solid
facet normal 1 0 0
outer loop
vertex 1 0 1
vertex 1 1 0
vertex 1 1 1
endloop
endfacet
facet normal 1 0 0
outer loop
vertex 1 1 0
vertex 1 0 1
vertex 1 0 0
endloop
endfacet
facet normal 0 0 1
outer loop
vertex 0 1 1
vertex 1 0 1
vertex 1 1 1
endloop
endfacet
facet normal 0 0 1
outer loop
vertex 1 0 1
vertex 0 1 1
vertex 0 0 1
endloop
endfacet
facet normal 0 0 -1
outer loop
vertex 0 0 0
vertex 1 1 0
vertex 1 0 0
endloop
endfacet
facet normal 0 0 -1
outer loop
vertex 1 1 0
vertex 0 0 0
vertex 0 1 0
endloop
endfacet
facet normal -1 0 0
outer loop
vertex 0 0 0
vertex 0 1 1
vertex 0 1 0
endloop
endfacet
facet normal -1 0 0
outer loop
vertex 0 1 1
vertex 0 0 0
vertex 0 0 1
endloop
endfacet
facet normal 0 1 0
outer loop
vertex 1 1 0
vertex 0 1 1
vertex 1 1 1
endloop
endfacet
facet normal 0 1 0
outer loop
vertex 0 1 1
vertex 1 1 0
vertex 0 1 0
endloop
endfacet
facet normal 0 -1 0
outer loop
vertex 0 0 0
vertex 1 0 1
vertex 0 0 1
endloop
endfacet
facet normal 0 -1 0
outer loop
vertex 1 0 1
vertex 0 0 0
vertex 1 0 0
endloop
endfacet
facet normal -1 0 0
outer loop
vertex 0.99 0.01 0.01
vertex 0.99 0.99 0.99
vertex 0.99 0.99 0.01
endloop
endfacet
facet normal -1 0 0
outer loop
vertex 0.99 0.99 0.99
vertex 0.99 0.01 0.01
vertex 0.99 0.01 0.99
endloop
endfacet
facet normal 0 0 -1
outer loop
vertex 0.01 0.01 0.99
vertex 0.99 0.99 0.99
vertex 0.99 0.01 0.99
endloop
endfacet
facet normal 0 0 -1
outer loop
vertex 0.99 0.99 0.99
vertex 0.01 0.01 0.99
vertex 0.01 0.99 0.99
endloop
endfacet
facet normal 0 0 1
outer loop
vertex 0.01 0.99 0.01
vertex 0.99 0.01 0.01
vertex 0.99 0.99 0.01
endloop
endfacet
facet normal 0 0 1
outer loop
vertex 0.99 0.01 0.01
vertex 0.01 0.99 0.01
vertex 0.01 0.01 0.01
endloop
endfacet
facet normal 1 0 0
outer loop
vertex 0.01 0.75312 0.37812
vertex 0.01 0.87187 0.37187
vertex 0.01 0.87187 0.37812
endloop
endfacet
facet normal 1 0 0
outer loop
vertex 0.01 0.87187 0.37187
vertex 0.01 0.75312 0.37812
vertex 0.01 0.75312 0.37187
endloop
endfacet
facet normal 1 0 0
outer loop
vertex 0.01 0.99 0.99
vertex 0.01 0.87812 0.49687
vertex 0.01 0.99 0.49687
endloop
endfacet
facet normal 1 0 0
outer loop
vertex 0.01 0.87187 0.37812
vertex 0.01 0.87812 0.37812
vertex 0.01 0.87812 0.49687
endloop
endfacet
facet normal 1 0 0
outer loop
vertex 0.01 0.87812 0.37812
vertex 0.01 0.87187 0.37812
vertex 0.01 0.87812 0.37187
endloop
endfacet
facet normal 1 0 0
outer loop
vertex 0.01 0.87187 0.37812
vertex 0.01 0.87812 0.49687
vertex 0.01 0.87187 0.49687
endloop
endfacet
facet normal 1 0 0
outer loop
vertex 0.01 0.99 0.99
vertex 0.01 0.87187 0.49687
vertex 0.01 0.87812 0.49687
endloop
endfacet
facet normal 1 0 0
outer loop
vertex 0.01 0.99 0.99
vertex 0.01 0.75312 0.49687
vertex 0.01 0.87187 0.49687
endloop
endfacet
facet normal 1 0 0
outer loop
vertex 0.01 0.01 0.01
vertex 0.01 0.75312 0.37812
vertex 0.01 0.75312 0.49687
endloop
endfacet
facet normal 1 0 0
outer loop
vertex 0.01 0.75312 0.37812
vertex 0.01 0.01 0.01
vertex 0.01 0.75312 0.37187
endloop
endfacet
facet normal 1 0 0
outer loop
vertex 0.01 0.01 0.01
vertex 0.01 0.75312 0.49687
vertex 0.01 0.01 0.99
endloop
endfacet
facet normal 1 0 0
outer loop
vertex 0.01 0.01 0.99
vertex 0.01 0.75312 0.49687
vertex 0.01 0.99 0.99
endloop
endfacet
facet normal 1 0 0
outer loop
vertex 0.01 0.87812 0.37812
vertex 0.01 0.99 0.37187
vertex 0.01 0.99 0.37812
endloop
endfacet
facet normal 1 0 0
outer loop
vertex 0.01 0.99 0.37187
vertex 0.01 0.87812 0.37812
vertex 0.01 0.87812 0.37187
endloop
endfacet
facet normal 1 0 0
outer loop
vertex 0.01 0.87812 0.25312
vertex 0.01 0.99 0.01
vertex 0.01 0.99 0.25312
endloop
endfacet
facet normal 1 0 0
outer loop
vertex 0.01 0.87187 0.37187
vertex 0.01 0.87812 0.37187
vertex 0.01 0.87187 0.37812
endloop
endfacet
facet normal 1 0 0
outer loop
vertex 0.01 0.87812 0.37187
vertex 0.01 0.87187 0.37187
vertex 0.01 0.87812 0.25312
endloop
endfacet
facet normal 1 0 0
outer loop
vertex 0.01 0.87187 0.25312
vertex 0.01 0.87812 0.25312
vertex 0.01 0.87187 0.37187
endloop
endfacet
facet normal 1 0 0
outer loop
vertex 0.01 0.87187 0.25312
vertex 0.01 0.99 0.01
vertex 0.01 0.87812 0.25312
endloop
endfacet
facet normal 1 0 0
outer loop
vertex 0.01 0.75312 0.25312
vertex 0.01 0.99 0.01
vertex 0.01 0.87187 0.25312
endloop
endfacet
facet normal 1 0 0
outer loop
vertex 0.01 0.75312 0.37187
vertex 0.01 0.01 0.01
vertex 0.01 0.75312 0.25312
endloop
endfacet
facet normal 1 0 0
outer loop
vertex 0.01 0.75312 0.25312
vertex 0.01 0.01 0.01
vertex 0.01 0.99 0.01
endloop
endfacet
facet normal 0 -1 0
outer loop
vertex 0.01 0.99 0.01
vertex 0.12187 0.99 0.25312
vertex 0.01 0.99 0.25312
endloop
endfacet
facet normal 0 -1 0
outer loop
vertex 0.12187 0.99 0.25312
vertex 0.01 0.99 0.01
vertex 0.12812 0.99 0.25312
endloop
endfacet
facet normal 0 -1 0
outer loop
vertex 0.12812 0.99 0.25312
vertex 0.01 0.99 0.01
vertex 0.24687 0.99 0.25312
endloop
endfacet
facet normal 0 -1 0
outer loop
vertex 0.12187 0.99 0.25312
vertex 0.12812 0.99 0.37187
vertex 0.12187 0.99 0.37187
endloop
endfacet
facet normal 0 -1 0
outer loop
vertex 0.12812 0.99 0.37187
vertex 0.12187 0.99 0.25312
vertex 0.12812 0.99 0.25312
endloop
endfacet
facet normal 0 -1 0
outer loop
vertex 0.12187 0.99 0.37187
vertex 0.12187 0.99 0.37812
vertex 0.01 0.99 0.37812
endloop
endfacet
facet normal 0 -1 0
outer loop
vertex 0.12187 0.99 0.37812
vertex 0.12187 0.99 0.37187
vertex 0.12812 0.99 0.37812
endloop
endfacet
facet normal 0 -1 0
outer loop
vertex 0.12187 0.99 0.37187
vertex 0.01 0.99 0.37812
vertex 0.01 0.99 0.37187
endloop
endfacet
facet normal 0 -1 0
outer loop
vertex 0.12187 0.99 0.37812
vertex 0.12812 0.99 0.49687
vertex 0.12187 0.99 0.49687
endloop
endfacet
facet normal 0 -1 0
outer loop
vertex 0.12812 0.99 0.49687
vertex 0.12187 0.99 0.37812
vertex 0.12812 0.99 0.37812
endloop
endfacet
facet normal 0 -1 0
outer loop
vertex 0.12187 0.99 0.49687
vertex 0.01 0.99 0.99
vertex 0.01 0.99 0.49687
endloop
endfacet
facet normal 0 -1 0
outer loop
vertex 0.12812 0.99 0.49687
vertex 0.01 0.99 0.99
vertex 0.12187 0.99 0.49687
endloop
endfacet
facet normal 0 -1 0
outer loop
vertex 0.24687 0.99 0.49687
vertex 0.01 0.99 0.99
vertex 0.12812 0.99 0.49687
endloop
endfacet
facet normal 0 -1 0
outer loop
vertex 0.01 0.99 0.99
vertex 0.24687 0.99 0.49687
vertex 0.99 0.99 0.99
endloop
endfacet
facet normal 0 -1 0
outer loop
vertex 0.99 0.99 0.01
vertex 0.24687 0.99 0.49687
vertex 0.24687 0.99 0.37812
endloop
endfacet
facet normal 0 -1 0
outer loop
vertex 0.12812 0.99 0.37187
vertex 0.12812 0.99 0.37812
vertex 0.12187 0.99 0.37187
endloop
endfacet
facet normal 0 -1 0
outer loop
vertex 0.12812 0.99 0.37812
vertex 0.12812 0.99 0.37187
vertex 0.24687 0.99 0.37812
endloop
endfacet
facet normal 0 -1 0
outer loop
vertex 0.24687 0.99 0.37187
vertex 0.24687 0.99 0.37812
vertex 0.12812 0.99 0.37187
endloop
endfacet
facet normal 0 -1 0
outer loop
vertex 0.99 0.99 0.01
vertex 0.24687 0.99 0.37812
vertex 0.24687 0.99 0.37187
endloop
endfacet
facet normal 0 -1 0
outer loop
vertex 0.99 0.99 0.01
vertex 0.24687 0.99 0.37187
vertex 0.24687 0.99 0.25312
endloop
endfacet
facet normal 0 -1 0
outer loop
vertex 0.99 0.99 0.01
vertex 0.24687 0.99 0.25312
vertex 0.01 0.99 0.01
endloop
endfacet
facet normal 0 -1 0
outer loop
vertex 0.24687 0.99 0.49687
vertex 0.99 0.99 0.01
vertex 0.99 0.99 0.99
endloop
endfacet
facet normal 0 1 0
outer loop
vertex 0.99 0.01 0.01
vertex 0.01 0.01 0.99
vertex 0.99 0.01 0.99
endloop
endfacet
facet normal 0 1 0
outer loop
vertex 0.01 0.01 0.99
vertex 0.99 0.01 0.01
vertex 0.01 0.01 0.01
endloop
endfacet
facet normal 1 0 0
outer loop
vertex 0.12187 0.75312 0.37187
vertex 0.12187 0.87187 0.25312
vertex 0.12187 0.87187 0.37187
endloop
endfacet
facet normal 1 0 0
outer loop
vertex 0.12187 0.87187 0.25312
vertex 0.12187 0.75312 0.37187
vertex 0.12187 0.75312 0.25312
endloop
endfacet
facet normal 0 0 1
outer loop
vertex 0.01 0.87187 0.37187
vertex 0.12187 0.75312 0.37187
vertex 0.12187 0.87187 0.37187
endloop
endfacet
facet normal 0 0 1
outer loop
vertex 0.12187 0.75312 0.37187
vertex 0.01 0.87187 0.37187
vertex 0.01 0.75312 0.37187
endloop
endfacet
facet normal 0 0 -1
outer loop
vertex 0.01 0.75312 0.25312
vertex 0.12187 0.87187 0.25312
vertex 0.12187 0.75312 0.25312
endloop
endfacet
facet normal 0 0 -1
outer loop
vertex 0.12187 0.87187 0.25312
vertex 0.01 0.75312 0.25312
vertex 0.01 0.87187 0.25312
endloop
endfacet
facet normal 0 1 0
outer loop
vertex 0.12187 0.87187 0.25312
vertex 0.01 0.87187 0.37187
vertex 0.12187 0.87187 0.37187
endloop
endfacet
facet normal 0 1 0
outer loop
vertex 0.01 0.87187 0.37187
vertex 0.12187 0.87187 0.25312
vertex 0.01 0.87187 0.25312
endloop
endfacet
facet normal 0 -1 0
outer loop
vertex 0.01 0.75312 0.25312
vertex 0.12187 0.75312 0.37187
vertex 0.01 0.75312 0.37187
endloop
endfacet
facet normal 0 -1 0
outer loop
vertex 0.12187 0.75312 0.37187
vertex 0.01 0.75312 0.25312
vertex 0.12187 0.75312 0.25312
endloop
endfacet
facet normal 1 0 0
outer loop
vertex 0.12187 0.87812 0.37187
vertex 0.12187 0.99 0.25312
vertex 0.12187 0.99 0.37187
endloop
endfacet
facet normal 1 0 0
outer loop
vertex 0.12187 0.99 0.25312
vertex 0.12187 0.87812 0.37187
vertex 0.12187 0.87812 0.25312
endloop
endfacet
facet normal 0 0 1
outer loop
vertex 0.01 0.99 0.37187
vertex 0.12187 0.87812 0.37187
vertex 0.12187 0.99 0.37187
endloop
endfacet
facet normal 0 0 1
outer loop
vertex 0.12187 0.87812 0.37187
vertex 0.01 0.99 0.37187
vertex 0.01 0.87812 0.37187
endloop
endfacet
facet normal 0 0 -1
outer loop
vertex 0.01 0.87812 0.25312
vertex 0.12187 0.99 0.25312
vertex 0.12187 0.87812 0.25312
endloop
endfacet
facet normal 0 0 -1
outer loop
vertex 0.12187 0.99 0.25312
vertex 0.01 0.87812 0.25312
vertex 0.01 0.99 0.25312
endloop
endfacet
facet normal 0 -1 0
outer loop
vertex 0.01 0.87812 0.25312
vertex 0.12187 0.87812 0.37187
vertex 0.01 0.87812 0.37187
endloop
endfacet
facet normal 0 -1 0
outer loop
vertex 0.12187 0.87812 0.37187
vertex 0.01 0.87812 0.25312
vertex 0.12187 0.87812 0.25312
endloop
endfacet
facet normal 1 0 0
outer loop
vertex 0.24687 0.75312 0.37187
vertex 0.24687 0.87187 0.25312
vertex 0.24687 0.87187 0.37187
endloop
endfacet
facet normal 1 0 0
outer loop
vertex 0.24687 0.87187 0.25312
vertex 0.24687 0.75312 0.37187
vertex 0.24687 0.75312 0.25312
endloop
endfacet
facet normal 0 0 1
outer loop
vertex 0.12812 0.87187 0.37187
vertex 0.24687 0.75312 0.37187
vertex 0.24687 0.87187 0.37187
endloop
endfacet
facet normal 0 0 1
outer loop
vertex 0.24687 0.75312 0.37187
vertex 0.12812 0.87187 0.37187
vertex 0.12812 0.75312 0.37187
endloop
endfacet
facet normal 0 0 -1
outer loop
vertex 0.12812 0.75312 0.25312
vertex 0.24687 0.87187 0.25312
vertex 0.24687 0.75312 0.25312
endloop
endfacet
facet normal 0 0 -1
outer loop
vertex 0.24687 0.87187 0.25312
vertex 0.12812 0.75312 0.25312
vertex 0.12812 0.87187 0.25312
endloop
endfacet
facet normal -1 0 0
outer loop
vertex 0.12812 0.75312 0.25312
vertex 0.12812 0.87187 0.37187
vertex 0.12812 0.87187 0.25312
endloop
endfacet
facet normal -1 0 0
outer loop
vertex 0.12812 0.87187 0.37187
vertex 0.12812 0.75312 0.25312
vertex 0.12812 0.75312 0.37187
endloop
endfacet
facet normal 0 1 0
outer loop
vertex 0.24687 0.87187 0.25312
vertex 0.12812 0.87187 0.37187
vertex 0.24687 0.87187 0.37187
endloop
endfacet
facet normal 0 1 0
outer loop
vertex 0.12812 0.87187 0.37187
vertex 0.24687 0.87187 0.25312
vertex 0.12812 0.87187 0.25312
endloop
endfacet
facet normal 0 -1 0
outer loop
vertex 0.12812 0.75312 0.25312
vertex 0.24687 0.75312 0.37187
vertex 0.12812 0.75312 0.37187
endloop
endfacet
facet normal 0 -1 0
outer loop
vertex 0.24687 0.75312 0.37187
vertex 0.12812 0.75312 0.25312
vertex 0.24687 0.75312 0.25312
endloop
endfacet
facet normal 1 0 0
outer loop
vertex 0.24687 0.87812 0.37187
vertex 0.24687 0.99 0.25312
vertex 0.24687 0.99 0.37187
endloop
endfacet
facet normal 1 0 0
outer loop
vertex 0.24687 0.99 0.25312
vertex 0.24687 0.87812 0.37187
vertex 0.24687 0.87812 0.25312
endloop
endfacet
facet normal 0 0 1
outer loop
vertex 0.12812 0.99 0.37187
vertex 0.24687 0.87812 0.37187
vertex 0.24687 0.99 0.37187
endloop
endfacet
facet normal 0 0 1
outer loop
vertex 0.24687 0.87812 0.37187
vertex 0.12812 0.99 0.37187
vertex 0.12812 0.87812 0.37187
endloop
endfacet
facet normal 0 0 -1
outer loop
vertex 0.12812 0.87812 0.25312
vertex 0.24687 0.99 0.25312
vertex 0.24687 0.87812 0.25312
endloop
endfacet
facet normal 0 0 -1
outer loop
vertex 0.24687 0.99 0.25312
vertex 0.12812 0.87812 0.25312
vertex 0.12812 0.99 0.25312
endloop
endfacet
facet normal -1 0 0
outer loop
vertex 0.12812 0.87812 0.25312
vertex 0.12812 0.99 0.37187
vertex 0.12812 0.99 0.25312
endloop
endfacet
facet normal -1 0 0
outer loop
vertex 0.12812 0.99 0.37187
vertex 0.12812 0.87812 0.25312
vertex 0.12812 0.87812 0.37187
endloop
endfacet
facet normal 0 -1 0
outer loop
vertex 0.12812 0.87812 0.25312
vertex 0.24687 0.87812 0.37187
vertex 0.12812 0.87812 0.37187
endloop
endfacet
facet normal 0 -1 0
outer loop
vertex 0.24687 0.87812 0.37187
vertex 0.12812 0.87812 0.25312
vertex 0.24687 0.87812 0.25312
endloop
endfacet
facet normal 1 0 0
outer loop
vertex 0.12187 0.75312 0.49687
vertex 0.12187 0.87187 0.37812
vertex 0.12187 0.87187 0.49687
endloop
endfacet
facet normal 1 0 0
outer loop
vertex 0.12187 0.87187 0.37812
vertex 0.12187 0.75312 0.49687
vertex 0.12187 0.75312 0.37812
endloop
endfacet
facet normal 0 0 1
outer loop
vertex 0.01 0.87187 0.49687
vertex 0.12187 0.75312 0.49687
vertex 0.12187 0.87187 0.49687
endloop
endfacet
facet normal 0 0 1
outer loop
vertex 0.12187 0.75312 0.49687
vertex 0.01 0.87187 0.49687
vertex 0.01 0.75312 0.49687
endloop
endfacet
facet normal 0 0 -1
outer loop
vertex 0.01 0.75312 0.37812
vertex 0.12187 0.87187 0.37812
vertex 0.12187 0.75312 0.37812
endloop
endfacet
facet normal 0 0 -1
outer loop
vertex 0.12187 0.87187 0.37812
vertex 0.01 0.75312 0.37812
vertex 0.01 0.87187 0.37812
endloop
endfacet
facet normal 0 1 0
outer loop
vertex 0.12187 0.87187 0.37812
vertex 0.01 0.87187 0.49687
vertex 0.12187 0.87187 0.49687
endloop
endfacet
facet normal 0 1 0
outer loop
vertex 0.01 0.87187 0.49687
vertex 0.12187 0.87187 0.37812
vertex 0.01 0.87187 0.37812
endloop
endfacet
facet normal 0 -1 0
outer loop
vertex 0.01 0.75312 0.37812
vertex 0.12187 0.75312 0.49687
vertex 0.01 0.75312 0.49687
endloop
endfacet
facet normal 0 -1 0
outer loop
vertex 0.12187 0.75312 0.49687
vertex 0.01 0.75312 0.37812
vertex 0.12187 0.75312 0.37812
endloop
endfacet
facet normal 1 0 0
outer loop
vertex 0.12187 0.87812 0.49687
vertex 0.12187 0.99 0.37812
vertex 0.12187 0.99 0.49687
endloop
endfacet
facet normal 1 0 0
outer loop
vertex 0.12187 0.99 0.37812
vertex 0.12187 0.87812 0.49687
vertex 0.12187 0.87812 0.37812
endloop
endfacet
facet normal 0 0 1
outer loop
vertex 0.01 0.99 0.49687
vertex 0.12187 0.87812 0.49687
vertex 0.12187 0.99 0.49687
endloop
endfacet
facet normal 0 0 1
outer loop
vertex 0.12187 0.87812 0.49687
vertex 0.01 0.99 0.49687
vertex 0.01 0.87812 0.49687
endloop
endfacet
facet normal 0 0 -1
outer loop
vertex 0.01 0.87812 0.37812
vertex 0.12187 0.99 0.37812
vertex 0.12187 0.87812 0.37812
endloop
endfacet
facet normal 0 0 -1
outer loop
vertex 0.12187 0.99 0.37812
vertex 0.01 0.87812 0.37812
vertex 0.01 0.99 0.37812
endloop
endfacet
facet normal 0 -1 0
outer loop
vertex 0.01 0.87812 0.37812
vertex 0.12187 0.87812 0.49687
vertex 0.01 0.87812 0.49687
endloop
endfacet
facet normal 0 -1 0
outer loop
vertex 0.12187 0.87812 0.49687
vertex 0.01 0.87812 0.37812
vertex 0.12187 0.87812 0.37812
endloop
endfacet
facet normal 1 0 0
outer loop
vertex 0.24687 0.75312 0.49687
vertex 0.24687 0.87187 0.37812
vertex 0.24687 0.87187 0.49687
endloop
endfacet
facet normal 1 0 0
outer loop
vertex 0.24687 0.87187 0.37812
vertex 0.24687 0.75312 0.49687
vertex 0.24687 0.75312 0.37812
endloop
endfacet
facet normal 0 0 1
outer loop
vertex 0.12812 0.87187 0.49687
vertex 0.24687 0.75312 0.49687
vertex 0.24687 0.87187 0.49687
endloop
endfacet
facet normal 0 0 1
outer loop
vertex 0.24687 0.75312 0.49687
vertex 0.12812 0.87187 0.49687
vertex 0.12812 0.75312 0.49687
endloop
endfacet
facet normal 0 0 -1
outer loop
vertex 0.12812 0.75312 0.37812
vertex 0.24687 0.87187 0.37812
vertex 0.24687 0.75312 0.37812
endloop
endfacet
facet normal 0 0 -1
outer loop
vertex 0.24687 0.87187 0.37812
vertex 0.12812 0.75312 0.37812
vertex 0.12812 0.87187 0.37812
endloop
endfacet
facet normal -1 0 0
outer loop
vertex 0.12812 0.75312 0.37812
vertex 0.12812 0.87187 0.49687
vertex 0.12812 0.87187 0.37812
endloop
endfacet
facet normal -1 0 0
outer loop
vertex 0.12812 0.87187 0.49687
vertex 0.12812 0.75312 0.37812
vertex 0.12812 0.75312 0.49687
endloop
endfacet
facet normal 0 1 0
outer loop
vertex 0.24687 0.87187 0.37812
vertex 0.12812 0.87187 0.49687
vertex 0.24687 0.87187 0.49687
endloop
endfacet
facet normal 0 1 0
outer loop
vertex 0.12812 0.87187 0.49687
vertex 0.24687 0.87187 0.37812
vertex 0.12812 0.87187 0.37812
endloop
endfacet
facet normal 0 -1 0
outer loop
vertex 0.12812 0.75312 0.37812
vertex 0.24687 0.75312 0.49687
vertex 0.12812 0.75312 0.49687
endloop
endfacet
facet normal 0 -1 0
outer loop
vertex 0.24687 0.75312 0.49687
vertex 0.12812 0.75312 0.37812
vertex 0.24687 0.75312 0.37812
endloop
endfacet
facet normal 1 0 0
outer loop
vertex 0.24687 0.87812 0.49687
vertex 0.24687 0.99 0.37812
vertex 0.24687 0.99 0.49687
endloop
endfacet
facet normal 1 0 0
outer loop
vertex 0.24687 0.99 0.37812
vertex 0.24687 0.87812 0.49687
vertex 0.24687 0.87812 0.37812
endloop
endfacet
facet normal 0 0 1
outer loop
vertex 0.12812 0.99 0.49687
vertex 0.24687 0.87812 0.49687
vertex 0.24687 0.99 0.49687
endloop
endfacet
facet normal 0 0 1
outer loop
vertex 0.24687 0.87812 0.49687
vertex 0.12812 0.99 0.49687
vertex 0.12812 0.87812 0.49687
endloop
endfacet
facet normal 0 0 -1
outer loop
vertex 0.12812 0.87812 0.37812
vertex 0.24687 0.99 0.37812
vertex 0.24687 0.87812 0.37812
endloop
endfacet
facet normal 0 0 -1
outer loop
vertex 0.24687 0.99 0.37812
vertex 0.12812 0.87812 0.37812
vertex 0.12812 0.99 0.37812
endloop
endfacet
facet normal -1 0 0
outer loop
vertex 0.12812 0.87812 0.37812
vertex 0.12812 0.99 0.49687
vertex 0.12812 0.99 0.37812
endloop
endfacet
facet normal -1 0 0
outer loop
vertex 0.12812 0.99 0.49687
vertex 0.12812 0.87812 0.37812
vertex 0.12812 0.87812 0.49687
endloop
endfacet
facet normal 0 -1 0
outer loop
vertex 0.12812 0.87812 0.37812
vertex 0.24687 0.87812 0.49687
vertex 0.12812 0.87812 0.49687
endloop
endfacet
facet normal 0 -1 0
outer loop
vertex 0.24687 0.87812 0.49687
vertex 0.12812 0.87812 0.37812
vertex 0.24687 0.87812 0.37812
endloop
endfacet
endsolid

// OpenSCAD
translate([0.0625, 0.8125, 0.3125]) color([0.2175972434529918, 0.4163783665321429, 0.9098439236409347]) cube([0.11875, 0.11875, 0.11875], center=true);
translate([0.0625, 0.9375, 0.3125]) color([0.25914792931457187, 0.2775326697655319, 0.14650876268586432]) cube([0.11875, 0.11875, 0.11875], center=true);
translate([0.1875, 0.8125, 0.3125]) color([0.2095618258471844, 0.3738458543605927, 0.447538901354982]) cube([0.11875, 0.11875, 0.11875], center=true);
translate([0.1875, 0.9375, 0.3125]) color([0.5975531070482064, 0.13355353318117502, 0.38467783092185204]) cube([0.11875, 0.11875, 0.11875], center=true);
translate([0.0625, 0.8125, 0.4375]) color([0.6047482555434874, 0.6921651308042475, 0.7793726087290122]) cube([0.11875, 0.11875, 0.11875], center=true);
translate([0.0625, 0.9375, 0.4375]) color([0.3957676756885411, 0.8998956753949915, 0.19744914753727016]) cube([0.11875, 0.11875, 0.11875], center=true);
translate([0.1875, 0.8125, 0.4375]) color([0.044872440589686424, 0.20282732922717495, 0.47778002198978586]) cube([0.11875, 0.11875, 0.11875], center=true);
translate([0.1875, 0.9375, 0.4375]) color([0.7565823833812777, 0.2079660995759225, 0.10719977146924453]) cube([0.11875, 0.11875, 0.11875], center=true);
color([0.3,0.3,0.3,0.3]) difference() { cube([1,1,1]); translate([0.01,0.01,0.01]) cube([0.98,0.98,0.98]); }
